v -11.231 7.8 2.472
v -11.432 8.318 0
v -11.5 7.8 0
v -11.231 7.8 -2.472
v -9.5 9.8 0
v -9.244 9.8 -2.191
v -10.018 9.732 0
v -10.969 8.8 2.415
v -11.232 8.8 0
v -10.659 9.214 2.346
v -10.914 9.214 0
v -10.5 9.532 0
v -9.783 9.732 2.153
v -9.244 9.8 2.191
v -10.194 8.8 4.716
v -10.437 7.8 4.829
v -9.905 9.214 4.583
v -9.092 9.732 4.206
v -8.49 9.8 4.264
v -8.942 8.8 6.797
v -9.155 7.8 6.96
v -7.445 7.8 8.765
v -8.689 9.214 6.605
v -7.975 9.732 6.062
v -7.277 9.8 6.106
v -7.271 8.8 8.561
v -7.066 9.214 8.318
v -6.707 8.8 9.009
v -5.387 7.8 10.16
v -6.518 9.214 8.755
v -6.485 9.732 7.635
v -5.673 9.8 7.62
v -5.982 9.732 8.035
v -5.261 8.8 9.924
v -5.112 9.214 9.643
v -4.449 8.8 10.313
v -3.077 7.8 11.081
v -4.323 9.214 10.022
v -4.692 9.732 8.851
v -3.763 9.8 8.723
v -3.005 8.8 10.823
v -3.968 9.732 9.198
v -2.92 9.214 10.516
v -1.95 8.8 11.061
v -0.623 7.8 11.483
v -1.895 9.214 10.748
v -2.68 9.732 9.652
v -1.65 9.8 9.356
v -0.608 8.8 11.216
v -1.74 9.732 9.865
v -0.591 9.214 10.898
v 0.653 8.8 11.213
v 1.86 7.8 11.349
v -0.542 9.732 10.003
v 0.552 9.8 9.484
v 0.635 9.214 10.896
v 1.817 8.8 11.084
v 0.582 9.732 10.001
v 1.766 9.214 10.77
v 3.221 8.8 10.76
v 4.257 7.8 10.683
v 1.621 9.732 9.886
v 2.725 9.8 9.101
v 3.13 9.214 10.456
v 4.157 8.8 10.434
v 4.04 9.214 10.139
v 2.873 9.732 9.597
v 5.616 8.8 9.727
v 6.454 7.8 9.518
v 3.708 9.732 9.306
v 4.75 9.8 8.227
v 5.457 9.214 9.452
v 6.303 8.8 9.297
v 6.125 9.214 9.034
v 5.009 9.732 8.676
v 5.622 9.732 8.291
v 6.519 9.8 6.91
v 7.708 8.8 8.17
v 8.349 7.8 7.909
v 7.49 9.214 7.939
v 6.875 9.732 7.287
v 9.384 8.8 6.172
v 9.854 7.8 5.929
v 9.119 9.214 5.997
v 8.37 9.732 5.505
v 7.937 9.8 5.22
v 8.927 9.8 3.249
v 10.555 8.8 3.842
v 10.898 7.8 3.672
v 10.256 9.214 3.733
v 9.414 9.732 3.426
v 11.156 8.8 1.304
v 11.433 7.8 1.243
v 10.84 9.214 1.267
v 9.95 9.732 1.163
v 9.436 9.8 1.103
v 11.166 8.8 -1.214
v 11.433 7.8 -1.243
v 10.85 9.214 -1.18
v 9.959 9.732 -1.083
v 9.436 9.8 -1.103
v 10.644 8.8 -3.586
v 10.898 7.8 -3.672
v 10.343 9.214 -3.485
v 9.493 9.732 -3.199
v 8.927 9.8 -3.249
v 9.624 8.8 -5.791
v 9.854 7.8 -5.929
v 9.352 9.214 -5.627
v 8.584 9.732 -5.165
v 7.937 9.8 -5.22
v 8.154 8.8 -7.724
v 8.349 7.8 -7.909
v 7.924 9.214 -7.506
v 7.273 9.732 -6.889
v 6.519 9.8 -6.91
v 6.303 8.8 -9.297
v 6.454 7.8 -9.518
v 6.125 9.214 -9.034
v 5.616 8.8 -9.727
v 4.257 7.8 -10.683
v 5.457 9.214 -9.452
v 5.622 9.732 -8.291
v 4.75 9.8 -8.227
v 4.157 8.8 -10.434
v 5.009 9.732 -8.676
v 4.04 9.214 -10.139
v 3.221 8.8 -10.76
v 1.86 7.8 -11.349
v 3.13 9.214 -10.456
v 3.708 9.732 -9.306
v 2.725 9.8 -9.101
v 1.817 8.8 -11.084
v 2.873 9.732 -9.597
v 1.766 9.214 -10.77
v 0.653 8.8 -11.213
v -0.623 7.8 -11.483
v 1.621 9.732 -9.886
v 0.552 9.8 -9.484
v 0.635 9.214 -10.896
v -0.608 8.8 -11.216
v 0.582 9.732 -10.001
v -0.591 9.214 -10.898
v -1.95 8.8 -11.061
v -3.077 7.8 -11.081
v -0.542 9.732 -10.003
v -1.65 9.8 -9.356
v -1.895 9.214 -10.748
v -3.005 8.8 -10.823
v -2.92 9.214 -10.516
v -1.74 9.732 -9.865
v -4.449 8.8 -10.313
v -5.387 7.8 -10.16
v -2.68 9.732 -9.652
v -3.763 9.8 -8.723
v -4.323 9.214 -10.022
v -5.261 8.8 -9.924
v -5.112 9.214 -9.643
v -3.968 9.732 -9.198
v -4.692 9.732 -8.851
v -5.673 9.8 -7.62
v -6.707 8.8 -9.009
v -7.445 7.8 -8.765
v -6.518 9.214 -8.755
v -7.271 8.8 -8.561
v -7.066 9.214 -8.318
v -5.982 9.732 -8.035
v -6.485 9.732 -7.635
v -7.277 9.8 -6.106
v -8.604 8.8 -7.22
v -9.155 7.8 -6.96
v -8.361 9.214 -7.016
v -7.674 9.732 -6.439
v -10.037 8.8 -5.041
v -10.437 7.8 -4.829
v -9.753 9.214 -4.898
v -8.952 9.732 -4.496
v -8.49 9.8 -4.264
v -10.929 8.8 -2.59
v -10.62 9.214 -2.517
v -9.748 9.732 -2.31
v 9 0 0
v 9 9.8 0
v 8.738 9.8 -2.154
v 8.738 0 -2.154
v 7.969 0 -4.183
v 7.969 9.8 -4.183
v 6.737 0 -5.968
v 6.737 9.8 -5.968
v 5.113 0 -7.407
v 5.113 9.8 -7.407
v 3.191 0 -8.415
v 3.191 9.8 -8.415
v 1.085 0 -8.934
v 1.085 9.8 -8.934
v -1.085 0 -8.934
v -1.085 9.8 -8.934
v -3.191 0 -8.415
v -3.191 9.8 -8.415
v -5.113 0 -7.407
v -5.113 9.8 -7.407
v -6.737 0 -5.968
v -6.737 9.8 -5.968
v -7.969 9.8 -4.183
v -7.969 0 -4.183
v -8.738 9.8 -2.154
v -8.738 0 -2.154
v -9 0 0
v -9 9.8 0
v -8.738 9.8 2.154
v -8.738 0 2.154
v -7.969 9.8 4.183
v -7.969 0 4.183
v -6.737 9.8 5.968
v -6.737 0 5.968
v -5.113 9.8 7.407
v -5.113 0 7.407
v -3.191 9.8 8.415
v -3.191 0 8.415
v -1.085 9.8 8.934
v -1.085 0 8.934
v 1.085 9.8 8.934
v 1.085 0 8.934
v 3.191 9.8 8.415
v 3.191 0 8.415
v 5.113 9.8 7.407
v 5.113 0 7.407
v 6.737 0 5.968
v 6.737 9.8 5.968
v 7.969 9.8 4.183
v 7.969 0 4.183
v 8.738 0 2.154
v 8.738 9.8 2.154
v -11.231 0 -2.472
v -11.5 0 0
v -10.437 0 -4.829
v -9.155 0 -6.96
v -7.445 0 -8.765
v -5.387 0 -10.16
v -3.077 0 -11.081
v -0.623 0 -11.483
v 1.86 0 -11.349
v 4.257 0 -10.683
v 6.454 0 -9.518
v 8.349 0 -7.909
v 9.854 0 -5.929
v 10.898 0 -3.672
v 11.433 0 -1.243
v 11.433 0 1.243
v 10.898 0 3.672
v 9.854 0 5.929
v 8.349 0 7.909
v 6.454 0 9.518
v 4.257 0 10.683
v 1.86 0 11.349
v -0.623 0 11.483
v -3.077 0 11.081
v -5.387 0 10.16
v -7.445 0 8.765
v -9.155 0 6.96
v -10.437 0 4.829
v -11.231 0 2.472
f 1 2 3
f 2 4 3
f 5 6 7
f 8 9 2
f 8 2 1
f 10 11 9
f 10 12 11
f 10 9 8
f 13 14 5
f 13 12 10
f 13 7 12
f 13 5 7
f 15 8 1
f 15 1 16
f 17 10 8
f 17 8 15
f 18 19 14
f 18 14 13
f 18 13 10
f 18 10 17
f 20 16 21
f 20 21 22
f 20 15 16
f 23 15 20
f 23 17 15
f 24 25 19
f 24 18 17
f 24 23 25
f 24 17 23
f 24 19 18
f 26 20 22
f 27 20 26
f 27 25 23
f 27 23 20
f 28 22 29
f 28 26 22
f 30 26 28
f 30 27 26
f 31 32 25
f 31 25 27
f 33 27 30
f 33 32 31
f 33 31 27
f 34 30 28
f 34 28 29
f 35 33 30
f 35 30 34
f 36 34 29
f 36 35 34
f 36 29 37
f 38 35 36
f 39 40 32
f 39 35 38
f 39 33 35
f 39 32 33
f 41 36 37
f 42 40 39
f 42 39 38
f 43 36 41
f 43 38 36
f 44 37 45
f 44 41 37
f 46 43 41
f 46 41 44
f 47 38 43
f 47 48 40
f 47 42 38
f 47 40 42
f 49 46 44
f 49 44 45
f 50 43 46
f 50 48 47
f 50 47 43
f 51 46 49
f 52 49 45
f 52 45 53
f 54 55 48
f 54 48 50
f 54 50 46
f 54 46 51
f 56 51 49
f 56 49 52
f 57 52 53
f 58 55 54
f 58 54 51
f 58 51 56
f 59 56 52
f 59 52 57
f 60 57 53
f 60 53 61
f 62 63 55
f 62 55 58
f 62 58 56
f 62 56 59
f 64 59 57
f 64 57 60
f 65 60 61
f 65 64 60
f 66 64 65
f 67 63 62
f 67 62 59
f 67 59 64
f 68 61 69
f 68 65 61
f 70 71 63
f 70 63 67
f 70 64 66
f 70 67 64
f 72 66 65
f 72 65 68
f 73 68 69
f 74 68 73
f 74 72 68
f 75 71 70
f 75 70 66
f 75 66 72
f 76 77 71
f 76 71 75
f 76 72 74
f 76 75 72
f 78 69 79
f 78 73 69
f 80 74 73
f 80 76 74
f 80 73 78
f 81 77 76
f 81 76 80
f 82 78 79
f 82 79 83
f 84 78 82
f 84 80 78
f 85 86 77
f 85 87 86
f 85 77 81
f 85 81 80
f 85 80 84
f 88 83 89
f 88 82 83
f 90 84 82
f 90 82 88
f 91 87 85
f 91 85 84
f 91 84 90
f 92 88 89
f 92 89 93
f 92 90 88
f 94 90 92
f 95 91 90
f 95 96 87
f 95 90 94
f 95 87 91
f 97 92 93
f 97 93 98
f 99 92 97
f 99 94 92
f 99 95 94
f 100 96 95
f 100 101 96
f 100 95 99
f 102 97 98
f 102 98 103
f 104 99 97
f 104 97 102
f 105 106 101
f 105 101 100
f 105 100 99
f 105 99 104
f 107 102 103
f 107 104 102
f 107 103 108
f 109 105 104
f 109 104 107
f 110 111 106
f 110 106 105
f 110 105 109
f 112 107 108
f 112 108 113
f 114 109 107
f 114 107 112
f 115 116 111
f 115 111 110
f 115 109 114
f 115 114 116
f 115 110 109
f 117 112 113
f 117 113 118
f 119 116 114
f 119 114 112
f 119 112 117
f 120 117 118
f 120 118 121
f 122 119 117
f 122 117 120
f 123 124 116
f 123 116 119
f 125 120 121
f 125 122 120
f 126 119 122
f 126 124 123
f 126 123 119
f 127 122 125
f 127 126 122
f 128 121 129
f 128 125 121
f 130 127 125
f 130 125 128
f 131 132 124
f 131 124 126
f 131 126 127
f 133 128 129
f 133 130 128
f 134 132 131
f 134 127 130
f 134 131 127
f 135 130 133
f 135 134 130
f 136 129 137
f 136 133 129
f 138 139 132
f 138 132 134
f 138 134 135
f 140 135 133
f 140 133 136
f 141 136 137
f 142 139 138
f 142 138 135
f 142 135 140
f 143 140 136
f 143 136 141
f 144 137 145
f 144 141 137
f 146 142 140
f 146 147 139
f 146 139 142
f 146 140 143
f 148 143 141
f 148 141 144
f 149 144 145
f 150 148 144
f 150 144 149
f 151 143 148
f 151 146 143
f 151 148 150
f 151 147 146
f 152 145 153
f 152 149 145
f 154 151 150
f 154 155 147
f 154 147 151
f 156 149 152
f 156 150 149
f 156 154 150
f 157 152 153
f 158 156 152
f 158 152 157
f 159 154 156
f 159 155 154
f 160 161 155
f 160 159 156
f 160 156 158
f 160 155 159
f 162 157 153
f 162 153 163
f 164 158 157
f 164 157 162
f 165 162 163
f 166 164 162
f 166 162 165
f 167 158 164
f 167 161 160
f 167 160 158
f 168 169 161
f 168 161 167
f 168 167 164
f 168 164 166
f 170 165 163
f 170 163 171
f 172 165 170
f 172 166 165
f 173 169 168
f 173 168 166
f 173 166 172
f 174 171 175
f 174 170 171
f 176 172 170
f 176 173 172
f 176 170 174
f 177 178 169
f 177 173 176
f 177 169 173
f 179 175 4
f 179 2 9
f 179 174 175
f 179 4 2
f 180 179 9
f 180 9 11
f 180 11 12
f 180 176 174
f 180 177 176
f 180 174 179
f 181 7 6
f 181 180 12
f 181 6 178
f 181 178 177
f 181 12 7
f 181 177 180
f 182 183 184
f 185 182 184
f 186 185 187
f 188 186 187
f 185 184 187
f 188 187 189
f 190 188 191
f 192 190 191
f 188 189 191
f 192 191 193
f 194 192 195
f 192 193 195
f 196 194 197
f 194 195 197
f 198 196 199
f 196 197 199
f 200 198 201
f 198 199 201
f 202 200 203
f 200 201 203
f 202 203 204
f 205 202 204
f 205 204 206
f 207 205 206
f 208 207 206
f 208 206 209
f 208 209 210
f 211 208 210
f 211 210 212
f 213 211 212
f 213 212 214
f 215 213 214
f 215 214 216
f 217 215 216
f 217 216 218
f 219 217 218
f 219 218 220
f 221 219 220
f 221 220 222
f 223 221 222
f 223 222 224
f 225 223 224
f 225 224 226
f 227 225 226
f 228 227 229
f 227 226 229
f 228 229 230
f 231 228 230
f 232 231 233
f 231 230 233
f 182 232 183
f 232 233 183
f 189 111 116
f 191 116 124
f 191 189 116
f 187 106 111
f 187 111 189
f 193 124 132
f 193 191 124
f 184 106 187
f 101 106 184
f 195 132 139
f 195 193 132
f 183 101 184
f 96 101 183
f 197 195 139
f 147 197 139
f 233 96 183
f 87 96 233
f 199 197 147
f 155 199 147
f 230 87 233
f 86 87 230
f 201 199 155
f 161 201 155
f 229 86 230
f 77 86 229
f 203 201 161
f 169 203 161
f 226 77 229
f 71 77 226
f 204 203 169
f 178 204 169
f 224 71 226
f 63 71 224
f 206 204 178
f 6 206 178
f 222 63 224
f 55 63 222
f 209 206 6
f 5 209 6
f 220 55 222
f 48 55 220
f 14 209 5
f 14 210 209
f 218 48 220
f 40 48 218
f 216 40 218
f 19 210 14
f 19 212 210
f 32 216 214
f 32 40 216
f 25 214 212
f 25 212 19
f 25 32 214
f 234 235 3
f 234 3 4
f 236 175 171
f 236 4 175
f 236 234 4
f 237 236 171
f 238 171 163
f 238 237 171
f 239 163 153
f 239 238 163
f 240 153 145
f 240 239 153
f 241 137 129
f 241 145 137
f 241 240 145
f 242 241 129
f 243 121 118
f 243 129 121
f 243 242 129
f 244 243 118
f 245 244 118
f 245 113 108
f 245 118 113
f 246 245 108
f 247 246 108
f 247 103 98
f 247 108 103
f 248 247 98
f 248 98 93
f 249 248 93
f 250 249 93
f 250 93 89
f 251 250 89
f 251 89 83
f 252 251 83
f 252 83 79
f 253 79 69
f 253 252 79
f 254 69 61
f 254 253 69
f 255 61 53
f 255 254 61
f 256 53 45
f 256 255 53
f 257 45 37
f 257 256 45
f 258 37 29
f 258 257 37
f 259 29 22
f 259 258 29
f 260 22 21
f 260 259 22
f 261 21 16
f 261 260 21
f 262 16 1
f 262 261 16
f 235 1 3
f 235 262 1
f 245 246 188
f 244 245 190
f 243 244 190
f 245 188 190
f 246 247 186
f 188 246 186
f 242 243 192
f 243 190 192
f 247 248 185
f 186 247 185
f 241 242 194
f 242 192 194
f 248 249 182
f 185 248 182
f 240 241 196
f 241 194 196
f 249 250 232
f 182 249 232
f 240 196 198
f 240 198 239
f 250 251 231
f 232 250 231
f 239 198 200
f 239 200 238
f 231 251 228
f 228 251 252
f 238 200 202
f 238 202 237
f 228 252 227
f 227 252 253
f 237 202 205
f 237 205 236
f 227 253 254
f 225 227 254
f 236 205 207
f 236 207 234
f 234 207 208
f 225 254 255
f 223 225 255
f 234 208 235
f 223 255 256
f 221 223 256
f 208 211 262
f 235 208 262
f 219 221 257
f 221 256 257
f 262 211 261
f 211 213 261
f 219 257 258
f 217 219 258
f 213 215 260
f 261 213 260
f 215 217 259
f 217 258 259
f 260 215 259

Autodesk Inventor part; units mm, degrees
ref_plane "YZ Plane" through (0, 0, 0) normal (1, 0, 0) x (0, 1, 0)
ref_plane "XZ Plane" through (0, 0, 0) normal (0, 1, 0) x (-1, 0, 0)
ref_plane "XY Plane" through (0, 0, 0) normal (0, 0, 1) x (1, 0, 0)
sketch "Sketch2" plane through (0, 0, 0) normal (0, 1, 0) x (-1, 0, 0)
  circle A0 centre (0, 0) radius 11.5
  dimension "d2" = 23
extrude "Extrusion1" add sketch "Sketch2" along normal blind 9.8
sketch "Sketch3" plane through (0, 9.8, 0) normal (0, 1, 0) x (1, 0, 0)
  circle A0 centre (0, 0) radius 9
  dimension "d5" = 18
extrude "Extrusion2" cut sketch "Sketch3" against normal through all
fillet "Fillet1" radius 2 1 edges at (11.5, 9.8, 0)
properties part number "Tires"
